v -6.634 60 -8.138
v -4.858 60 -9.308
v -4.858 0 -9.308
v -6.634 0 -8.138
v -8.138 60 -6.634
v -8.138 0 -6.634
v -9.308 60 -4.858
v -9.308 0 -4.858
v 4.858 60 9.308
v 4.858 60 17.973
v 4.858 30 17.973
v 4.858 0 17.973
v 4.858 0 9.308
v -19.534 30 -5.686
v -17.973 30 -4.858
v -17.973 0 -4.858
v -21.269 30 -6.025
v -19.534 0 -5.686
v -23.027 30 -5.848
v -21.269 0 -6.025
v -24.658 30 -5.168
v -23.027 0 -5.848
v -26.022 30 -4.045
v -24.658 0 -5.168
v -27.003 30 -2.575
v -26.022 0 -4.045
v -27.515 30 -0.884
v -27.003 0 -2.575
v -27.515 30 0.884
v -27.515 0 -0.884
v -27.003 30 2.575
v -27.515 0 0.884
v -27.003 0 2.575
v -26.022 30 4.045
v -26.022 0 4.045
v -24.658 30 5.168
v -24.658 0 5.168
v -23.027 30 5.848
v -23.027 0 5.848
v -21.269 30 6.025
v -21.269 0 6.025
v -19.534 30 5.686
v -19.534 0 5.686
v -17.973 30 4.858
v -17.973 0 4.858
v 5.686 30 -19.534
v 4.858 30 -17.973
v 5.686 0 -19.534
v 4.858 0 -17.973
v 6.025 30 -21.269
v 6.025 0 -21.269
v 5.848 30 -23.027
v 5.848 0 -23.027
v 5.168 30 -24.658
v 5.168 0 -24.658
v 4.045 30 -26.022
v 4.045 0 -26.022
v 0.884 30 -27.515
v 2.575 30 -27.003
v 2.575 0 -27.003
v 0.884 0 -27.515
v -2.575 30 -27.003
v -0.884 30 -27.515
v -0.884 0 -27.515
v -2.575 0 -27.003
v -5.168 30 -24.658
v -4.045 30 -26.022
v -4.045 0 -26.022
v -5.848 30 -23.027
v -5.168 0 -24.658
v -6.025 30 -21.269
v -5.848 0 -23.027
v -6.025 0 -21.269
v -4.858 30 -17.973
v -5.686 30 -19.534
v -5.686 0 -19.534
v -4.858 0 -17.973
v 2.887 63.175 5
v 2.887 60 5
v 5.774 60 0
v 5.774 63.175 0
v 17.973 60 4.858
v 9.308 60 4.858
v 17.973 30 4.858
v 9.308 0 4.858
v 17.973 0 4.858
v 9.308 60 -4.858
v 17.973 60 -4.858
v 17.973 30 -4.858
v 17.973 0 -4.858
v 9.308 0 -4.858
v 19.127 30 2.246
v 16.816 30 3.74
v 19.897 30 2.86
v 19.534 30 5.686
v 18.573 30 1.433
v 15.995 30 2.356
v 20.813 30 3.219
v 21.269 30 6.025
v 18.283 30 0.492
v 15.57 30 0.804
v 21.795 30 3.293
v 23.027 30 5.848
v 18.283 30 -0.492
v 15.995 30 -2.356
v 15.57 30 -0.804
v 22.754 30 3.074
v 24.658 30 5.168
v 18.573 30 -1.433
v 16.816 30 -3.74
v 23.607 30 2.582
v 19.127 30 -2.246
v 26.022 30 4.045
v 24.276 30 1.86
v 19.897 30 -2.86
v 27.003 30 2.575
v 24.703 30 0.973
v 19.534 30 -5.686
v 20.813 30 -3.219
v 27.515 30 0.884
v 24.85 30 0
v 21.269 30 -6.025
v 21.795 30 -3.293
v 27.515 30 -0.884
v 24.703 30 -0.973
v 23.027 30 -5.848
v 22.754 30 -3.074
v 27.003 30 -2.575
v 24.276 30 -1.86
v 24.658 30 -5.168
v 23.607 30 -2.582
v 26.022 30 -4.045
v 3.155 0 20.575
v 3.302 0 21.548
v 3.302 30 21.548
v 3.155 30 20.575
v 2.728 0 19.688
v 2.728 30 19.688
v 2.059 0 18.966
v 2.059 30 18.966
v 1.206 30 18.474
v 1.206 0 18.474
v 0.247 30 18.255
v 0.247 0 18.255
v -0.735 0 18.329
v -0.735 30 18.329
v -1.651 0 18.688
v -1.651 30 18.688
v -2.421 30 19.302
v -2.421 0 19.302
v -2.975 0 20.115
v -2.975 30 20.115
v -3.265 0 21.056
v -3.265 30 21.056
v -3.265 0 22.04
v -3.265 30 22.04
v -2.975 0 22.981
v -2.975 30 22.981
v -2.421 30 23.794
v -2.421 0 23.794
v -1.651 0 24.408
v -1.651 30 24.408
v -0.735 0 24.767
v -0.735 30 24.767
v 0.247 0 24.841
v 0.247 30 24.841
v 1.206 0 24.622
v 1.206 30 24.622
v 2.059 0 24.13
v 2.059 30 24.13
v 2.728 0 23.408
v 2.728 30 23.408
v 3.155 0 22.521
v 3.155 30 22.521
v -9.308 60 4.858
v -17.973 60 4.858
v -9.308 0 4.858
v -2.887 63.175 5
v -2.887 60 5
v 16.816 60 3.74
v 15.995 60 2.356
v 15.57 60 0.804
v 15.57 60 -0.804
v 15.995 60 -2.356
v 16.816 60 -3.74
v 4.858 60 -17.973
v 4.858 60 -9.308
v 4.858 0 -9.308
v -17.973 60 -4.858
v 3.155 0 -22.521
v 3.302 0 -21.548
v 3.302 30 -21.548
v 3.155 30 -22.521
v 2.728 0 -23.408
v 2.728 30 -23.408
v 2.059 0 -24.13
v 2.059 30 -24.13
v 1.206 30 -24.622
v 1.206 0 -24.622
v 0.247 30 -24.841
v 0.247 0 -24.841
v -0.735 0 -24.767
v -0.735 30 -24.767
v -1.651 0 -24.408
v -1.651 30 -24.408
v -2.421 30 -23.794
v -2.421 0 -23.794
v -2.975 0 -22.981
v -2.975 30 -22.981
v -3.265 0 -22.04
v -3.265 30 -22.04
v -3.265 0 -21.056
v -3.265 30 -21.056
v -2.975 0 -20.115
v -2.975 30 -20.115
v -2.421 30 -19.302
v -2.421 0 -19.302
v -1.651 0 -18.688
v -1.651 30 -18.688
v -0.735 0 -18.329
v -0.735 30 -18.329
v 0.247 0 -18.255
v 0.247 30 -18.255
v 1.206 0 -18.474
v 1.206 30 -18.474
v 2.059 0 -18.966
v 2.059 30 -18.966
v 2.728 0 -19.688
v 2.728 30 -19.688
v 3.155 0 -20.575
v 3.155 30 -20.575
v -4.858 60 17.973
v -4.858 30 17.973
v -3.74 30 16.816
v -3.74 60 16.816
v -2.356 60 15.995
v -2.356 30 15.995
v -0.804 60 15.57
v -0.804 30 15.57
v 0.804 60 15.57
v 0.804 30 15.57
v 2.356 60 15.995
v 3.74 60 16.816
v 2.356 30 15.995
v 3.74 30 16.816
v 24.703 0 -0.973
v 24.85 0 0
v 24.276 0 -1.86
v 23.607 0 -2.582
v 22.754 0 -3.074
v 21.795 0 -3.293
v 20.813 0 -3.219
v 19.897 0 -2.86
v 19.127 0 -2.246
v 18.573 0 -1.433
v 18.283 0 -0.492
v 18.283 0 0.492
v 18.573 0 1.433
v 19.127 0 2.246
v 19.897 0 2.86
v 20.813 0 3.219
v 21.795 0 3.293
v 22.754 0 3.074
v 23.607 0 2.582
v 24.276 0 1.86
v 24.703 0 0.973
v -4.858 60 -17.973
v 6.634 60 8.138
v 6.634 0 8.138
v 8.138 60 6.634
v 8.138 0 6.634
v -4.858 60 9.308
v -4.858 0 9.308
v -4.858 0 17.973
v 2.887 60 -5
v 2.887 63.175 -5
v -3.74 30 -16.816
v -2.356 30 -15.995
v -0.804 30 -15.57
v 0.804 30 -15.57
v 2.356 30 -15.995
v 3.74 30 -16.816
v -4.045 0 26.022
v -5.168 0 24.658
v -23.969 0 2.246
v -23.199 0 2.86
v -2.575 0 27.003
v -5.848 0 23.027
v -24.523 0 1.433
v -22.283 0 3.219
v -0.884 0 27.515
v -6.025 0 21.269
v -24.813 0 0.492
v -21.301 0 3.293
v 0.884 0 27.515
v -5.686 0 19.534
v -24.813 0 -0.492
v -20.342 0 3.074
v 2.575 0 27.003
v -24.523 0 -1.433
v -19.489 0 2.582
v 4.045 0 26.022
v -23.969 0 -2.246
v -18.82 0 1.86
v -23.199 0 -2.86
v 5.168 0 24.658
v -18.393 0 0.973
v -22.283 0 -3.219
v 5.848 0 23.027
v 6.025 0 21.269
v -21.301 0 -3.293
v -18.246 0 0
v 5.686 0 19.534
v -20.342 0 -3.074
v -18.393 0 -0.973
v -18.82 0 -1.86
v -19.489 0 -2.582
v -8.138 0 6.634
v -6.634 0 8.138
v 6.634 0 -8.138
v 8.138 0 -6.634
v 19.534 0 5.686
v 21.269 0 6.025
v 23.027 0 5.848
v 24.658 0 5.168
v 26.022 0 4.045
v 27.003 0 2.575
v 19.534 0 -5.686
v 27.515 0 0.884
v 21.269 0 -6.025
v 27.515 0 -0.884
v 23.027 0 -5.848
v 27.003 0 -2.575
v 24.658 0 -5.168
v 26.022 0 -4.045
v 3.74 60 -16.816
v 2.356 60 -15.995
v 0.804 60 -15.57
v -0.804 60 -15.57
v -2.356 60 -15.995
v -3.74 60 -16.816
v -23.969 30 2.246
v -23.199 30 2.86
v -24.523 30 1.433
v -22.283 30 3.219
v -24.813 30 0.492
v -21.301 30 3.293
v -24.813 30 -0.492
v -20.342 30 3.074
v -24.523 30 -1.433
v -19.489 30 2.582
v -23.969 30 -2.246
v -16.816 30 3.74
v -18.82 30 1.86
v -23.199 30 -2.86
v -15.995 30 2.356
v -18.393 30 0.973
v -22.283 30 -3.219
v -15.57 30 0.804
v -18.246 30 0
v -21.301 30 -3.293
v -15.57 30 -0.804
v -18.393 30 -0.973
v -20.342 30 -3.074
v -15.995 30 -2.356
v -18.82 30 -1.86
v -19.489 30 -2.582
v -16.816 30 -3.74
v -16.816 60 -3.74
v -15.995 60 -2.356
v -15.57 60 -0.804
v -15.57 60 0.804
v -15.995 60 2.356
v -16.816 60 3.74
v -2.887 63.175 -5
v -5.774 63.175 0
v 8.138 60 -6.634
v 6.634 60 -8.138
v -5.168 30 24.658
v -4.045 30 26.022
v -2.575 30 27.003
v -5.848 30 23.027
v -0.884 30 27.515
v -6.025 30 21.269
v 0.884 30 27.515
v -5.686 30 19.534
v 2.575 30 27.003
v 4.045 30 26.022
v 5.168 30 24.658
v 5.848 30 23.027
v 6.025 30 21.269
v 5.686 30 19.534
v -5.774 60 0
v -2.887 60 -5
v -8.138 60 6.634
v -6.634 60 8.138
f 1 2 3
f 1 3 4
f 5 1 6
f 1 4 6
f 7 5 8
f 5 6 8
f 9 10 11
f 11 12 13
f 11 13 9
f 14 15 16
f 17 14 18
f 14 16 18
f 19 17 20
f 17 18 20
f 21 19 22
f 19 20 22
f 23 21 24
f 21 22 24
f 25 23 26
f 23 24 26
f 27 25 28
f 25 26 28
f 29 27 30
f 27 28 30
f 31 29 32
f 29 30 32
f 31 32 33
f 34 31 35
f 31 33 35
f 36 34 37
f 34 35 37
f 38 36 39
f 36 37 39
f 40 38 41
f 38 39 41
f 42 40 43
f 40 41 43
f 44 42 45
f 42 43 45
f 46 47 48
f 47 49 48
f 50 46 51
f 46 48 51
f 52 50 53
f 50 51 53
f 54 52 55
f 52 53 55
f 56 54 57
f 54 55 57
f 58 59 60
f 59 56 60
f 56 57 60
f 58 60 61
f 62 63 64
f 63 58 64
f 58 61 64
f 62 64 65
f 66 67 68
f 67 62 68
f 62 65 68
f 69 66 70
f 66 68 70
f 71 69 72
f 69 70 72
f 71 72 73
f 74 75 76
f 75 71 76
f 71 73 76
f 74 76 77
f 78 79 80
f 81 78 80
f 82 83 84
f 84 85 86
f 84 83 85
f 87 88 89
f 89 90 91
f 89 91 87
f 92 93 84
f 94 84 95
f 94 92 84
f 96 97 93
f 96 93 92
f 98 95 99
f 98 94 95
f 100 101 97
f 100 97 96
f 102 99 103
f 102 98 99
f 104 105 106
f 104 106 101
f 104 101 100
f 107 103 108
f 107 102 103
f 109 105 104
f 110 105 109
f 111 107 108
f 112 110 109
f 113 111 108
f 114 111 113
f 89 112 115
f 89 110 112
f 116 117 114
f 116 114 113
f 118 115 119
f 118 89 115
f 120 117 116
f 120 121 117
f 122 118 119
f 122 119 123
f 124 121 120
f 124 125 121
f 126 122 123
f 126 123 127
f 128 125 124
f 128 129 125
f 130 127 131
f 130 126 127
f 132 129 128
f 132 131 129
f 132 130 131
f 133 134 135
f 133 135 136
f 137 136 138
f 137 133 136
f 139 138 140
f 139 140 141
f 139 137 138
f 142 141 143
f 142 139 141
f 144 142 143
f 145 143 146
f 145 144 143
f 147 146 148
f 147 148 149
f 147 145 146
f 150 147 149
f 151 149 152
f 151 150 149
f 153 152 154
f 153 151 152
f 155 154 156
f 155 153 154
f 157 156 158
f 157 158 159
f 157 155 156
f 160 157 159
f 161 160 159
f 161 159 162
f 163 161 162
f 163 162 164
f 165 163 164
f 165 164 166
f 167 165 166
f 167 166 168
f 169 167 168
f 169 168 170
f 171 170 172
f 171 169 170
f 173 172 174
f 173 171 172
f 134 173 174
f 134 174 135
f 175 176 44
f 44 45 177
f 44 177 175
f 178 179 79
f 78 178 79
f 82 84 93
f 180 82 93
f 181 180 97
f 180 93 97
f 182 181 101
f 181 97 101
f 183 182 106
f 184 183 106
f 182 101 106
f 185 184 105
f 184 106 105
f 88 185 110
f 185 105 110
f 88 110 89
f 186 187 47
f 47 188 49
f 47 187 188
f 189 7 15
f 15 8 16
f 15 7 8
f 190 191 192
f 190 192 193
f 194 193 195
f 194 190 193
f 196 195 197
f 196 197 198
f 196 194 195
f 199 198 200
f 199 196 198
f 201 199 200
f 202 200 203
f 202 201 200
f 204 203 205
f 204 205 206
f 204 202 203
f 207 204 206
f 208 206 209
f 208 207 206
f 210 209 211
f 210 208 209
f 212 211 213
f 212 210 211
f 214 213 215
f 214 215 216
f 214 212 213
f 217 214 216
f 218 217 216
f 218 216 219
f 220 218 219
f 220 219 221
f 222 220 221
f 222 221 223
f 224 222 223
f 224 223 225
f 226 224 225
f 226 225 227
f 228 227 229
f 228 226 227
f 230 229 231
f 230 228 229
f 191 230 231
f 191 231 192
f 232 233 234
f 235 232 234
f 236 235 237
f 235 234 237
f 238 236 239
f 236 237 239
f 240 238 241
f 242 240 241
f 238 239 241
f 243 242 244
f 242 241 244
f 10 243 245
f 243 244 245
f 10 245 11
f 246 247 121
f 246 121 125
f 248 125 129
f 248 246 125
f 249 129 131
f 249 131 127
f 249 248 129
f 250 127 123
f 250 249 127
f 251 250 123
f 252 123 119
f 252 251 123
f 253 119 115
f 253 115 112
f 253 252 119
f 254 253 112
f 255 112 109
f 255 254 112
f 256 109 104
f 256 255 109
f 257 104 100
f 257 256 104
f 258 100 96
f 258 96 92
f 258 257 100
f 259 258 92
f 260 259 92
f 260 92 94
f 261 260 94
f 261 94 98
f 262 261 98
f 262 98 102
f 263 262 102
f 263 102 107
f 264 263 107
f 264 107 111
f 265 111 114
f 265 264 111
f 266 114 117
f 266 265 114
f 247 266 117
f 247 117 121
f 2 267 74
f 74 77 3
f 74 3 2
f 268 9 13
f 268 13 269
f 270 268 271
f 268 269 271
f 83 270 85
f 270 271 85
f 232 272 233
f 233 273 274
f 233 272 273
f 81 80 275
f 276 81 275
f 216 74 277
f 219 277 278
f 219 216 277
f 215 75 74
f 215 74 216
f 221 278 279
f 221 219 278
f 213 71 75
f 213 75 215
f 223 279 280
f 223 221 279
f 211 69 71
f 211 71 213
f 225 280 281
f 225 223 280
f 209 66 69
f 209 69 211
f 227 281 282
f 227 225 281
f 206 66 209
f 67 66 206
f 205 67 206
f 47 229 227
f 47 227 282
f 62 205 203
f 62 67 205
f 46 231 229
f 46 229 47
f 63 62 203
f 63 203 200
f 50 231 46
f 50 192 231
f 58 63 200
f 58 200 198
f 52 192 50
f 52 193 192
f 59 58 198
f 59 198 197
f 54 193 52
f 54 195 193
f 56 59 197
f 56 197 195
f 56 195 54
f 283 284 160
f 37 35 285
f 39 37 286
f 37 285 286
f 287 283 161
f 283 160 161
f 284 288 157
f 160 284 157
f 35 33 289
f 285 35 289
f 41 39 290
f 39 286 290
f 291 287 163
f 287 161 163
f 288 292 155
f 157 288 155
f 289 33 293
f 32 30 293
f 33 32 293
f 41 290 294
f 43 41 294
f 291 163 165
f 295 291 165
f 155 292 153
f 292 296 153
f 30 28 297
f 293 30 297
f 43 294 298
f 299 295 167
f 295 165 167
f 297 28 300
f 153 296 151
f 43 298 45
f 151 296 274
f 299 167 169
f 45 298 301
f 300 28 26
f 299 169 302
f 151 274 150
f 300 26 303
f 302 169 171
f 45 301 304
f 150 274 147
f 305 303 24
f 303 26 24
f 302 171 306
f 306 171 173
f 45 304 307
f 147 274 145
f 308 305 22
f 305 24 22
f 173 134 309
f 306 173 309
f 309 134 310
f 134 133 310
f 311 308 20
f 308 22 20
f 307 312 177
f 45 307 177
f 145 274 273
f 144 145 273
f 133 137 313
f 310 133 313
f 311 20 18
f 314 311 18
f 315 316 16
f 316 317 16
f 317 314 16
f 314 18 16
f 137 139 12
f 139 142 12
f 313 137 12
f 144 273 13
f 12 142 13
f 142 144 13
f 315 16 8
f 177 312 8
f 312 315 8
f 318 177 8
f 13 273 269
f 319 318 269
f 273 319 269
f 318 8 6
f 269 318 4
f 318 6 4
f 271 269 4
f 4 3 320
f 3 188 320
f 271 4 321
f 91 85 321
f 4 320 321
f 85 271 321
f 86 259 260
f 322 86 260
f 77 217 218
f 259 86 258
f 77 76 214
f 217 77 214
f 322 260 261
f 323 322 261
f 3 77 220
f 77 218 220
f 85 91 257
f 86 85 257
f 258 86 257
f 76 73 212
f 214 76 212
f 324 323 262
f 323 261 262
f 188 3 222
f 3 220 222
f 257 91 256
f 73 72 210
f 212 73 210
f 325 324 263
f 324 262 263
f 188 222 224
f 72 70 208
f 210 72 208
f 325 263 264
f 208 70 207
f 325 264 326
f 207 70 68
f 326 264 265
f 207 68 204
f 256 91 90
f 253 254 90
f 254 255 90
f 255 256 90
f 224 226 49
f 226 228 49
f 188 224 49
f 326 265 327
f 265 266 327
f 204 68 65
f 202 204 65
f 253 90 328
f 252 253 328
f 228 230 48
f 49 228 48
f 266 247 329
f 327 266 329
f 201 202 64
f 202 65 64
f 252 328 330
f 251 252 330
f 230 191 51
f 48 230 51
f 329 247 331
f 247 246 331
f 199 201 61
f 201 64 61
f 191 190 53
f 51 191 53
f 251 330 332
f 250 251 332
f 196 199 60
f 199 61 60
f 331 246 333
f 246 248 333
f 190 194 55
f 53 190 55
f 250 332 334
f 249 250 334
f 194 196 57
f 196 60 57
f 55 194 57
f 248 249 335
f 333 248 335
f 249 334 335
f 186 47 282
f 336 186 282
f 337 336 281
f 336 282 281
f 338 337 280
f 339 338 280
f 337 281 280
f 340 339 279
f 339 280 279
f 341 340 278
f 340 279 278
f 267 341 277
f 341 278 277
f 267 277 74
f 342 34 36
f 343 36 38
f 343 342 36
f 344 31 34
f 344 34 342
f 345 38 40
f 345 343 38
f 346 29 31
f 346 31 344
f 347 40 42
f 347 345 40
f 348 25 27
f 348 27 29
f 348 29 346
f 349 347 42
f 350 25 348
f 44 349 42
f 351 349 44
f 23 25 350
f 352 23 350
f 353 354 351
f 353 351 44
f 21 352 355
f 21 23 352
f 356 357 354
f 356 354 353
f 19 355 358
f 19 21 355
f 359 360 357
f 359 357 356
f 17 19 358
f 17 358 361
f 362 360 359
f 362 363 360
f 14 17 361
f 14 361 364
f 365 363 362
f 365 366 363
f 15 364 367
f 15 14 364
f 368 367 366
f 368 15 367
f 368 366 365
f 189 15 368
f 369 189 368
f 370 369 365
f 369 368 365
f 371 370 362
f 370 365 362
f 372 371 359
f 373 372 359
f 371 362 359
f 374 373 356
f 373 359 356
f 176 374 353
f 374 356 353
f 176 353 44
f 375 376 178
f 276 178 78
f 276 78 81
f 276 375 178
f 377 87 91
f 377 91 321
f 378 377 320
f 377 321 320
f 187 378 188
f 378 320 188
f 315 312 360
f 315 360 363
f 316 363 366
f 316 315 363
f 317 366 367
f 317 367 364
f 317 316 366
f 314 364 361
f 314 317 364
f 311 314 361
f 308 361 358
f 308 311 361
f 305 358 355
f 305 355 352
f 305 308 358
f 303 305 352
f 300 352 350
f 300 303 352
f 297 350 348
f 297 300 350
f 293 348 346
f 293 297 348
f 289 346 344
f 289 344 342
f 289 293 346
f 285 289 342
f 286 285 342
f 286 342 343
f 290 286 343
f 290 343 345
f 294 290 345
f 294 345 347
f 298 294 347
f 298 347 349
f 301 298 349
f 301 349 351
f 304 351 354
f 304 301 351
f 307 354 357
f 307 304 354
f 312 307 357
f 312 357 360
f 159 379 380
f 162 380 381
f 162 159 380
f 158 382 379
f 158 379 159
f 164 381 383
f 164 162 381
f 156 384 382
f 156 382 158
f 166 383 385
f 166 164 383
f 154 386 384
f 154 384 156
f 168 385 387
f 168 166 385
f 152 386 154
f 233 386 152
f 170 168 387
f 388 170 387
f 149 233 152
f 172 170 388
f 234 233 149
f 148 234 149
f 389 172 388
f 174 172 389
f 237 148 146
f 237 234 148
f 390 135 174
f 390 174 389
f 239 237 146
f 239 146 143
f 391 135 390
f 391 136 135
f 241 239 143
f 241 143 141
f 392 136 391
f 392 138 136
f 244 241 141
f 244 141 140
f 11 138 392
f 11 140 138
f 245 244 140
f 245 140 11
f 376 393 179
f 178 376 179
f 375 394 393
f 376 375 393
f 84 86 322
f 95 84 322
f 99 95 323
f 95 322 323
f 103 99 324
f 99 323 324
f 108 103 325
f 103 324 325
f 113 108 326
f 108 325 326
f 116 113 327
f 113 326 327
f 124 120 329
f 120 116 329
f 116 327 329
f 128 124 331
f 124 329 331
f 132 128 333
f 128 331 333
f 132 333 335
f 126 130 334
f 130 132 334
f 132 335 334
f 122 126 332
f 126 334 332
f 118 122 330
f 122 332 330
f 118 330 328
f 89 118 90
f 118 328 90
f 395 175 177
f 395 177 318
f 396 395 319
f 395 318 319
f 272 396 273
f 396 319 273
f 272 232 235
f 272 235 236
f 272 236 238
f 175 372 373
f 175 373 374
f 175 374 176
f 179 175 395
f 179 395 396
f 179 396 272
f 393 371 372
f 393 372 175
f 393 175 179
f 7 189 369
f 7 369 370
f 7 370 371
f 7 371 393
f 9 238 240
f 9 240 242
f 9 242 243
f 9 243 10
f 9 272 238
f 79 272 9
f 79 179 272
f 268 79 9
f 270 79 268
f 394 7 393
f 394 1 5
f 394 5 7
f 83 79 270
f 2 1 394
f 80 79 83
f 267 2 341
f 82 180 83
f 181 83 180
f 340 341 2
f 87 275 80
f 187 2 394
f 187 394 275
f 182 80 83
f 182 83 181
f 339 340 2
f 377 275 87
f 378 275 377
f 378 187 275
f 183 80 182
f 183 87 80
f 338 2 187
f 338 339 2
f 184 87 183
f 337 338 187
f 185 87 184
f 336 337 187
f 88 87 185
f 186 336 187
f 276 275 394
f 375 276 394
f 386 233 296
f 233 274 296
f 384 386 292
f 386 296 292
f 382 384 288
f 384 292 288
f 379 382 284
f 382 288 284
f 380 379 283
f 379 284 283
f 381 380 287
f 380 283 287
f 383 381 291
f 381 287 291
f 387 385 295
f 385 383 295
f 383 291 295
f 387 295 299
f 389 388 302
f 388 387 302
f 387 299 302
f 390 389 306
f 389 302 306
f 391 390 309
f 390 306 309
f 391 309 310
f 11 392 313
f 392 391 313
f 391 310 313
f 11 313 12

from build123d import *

# Parameters (mm, degrees)
BOSS_EXTRUDE1_DEPTH = 60
SKETCH1_3_R         = 6.03192879
SKETCH1_3_R_2       = 3.302
BOSS_EXTRUDE2_DEPTH = 30
BOSS_EXTRUDE3_DEPTH = 3.175


with BuildPart() as part:
    # Sketch1 → Boss-Extrude1 (new body)
    with BuildSketch(Plane(origin=(0, 0, 0), x_dir=(1, 0, 0), z_dir=(0, 1, 0))):
        with BuildLine():
            ThreePointArc((17.972934813, -4.85829948), (15.51607121, 0), (17.972934813, 4.85829948))
            Line((17.972934813, 4.85829948), (9.308433067, 4.85829948))
            ThreePointArc((9.308433067, 4.85829948), (7.424621202, 7.424621202), (4.85829948, 9.308433067))
            Line((4.85829948, 9.308433067), (4.85829948, 17.972934813))
            ThreePointArc((4.85829948, 17.972934813), (0, 15.51607121), (-4.85829948, 17.972934813))
            Line((-4.85829948, 17.972934813), (-4.85829948, 9.308433067))
            ThreePointArc((-4.85829948, 9.308433067), (-7.424621202, 7.424621202), (-9.308433067, 4.85829948))
            Line((-9.308433067, 4.85829948), (-17.972934813, 4.85829948))
            ThreePointArc((-17.972934813, 4.85829948), (-15.51607121, 0), (-17.972934813, -4.85829948))
            Line((-17.972934813, -4.85829948), (-9.308433067, -4.85829948))
            ThreePointArc((-9.308433067, -4.85829948), (-7.424621202, -7.424621202), (-4.85829948, -9.308433067))
            Line((-4.85829948, -9.308433067), (-4.85829948, -17.972934813))
            ThreePointArc((-4.85829948, -17.972934813), (0, -15.51607121), (4.85829948, -17.972934813))
            Line((4.85829948, -17.972934813), (4.85829948, -9.308433067))
            ThreePointArc((4.85829948, -9.308433067), (7.424621202, -7.424621202), (9.308433067, -4.85829948))
            Line((9.308433067, -4.85829948), (17.972934813, -4.85829948))
        make_face()
    extrude(amount=BOSS_EXTRUDE1_DEPTH)

    # Sketch1_3 → Boss-Extrude2 (add)
    with BuildSketch(Plane(origin=(0, 0, 0), x_dir=(1, 0, 0), z_dir=(0, 1, 0))):
        with Locations((21.548, 0)):
            Circle(SKETCH1_3_R)
        with Locations((21.548, 0)):
            Circle(SKETCH1_3_R_2, mode=Mode.SUBTRACT)
        with Locations((0, -21.548)):
            Circle(SKETCH1_3_R)
        with Locations((0, -21.548)):
            Circle(SKETCH1_3_R_2, mode=Mode.SUBTRACT)
        with Locations((-21.548, 0)):
            Circle(SKETCH1_3_R)
        with Locations((-21.548, 0)):
            Circle(SKETCH1_3_R_2, mode=Mode.SUBTRACT)
        with Locations((0, 21.548)):
            Circle(SKETCH1_3_R)
        with Locations((0, 21.548)):
            Circle(SKETCH1_3_R_2, mode=Mode.SUBTRACT)
    extrude(amount=BOSS_EXTRUDE2_DEPTH)

    # Sketch2 → Boss-Extrude3 (add)
    with BuildSketch(Plane(origin=(0, 60, 0), x_dir=(1, 0, 0), z_dir=(0, 1, 0))):
        Polygon((5.773502692, 0), (2.886751346, 5), (-2.886751346, 5), (-5.773502692, 0), (-2.886751346, -5), (2.886751346, -5), align=None)
    extrude(amount=BOSS_EXTRUDE3_DEPTH)


solid = part.part
